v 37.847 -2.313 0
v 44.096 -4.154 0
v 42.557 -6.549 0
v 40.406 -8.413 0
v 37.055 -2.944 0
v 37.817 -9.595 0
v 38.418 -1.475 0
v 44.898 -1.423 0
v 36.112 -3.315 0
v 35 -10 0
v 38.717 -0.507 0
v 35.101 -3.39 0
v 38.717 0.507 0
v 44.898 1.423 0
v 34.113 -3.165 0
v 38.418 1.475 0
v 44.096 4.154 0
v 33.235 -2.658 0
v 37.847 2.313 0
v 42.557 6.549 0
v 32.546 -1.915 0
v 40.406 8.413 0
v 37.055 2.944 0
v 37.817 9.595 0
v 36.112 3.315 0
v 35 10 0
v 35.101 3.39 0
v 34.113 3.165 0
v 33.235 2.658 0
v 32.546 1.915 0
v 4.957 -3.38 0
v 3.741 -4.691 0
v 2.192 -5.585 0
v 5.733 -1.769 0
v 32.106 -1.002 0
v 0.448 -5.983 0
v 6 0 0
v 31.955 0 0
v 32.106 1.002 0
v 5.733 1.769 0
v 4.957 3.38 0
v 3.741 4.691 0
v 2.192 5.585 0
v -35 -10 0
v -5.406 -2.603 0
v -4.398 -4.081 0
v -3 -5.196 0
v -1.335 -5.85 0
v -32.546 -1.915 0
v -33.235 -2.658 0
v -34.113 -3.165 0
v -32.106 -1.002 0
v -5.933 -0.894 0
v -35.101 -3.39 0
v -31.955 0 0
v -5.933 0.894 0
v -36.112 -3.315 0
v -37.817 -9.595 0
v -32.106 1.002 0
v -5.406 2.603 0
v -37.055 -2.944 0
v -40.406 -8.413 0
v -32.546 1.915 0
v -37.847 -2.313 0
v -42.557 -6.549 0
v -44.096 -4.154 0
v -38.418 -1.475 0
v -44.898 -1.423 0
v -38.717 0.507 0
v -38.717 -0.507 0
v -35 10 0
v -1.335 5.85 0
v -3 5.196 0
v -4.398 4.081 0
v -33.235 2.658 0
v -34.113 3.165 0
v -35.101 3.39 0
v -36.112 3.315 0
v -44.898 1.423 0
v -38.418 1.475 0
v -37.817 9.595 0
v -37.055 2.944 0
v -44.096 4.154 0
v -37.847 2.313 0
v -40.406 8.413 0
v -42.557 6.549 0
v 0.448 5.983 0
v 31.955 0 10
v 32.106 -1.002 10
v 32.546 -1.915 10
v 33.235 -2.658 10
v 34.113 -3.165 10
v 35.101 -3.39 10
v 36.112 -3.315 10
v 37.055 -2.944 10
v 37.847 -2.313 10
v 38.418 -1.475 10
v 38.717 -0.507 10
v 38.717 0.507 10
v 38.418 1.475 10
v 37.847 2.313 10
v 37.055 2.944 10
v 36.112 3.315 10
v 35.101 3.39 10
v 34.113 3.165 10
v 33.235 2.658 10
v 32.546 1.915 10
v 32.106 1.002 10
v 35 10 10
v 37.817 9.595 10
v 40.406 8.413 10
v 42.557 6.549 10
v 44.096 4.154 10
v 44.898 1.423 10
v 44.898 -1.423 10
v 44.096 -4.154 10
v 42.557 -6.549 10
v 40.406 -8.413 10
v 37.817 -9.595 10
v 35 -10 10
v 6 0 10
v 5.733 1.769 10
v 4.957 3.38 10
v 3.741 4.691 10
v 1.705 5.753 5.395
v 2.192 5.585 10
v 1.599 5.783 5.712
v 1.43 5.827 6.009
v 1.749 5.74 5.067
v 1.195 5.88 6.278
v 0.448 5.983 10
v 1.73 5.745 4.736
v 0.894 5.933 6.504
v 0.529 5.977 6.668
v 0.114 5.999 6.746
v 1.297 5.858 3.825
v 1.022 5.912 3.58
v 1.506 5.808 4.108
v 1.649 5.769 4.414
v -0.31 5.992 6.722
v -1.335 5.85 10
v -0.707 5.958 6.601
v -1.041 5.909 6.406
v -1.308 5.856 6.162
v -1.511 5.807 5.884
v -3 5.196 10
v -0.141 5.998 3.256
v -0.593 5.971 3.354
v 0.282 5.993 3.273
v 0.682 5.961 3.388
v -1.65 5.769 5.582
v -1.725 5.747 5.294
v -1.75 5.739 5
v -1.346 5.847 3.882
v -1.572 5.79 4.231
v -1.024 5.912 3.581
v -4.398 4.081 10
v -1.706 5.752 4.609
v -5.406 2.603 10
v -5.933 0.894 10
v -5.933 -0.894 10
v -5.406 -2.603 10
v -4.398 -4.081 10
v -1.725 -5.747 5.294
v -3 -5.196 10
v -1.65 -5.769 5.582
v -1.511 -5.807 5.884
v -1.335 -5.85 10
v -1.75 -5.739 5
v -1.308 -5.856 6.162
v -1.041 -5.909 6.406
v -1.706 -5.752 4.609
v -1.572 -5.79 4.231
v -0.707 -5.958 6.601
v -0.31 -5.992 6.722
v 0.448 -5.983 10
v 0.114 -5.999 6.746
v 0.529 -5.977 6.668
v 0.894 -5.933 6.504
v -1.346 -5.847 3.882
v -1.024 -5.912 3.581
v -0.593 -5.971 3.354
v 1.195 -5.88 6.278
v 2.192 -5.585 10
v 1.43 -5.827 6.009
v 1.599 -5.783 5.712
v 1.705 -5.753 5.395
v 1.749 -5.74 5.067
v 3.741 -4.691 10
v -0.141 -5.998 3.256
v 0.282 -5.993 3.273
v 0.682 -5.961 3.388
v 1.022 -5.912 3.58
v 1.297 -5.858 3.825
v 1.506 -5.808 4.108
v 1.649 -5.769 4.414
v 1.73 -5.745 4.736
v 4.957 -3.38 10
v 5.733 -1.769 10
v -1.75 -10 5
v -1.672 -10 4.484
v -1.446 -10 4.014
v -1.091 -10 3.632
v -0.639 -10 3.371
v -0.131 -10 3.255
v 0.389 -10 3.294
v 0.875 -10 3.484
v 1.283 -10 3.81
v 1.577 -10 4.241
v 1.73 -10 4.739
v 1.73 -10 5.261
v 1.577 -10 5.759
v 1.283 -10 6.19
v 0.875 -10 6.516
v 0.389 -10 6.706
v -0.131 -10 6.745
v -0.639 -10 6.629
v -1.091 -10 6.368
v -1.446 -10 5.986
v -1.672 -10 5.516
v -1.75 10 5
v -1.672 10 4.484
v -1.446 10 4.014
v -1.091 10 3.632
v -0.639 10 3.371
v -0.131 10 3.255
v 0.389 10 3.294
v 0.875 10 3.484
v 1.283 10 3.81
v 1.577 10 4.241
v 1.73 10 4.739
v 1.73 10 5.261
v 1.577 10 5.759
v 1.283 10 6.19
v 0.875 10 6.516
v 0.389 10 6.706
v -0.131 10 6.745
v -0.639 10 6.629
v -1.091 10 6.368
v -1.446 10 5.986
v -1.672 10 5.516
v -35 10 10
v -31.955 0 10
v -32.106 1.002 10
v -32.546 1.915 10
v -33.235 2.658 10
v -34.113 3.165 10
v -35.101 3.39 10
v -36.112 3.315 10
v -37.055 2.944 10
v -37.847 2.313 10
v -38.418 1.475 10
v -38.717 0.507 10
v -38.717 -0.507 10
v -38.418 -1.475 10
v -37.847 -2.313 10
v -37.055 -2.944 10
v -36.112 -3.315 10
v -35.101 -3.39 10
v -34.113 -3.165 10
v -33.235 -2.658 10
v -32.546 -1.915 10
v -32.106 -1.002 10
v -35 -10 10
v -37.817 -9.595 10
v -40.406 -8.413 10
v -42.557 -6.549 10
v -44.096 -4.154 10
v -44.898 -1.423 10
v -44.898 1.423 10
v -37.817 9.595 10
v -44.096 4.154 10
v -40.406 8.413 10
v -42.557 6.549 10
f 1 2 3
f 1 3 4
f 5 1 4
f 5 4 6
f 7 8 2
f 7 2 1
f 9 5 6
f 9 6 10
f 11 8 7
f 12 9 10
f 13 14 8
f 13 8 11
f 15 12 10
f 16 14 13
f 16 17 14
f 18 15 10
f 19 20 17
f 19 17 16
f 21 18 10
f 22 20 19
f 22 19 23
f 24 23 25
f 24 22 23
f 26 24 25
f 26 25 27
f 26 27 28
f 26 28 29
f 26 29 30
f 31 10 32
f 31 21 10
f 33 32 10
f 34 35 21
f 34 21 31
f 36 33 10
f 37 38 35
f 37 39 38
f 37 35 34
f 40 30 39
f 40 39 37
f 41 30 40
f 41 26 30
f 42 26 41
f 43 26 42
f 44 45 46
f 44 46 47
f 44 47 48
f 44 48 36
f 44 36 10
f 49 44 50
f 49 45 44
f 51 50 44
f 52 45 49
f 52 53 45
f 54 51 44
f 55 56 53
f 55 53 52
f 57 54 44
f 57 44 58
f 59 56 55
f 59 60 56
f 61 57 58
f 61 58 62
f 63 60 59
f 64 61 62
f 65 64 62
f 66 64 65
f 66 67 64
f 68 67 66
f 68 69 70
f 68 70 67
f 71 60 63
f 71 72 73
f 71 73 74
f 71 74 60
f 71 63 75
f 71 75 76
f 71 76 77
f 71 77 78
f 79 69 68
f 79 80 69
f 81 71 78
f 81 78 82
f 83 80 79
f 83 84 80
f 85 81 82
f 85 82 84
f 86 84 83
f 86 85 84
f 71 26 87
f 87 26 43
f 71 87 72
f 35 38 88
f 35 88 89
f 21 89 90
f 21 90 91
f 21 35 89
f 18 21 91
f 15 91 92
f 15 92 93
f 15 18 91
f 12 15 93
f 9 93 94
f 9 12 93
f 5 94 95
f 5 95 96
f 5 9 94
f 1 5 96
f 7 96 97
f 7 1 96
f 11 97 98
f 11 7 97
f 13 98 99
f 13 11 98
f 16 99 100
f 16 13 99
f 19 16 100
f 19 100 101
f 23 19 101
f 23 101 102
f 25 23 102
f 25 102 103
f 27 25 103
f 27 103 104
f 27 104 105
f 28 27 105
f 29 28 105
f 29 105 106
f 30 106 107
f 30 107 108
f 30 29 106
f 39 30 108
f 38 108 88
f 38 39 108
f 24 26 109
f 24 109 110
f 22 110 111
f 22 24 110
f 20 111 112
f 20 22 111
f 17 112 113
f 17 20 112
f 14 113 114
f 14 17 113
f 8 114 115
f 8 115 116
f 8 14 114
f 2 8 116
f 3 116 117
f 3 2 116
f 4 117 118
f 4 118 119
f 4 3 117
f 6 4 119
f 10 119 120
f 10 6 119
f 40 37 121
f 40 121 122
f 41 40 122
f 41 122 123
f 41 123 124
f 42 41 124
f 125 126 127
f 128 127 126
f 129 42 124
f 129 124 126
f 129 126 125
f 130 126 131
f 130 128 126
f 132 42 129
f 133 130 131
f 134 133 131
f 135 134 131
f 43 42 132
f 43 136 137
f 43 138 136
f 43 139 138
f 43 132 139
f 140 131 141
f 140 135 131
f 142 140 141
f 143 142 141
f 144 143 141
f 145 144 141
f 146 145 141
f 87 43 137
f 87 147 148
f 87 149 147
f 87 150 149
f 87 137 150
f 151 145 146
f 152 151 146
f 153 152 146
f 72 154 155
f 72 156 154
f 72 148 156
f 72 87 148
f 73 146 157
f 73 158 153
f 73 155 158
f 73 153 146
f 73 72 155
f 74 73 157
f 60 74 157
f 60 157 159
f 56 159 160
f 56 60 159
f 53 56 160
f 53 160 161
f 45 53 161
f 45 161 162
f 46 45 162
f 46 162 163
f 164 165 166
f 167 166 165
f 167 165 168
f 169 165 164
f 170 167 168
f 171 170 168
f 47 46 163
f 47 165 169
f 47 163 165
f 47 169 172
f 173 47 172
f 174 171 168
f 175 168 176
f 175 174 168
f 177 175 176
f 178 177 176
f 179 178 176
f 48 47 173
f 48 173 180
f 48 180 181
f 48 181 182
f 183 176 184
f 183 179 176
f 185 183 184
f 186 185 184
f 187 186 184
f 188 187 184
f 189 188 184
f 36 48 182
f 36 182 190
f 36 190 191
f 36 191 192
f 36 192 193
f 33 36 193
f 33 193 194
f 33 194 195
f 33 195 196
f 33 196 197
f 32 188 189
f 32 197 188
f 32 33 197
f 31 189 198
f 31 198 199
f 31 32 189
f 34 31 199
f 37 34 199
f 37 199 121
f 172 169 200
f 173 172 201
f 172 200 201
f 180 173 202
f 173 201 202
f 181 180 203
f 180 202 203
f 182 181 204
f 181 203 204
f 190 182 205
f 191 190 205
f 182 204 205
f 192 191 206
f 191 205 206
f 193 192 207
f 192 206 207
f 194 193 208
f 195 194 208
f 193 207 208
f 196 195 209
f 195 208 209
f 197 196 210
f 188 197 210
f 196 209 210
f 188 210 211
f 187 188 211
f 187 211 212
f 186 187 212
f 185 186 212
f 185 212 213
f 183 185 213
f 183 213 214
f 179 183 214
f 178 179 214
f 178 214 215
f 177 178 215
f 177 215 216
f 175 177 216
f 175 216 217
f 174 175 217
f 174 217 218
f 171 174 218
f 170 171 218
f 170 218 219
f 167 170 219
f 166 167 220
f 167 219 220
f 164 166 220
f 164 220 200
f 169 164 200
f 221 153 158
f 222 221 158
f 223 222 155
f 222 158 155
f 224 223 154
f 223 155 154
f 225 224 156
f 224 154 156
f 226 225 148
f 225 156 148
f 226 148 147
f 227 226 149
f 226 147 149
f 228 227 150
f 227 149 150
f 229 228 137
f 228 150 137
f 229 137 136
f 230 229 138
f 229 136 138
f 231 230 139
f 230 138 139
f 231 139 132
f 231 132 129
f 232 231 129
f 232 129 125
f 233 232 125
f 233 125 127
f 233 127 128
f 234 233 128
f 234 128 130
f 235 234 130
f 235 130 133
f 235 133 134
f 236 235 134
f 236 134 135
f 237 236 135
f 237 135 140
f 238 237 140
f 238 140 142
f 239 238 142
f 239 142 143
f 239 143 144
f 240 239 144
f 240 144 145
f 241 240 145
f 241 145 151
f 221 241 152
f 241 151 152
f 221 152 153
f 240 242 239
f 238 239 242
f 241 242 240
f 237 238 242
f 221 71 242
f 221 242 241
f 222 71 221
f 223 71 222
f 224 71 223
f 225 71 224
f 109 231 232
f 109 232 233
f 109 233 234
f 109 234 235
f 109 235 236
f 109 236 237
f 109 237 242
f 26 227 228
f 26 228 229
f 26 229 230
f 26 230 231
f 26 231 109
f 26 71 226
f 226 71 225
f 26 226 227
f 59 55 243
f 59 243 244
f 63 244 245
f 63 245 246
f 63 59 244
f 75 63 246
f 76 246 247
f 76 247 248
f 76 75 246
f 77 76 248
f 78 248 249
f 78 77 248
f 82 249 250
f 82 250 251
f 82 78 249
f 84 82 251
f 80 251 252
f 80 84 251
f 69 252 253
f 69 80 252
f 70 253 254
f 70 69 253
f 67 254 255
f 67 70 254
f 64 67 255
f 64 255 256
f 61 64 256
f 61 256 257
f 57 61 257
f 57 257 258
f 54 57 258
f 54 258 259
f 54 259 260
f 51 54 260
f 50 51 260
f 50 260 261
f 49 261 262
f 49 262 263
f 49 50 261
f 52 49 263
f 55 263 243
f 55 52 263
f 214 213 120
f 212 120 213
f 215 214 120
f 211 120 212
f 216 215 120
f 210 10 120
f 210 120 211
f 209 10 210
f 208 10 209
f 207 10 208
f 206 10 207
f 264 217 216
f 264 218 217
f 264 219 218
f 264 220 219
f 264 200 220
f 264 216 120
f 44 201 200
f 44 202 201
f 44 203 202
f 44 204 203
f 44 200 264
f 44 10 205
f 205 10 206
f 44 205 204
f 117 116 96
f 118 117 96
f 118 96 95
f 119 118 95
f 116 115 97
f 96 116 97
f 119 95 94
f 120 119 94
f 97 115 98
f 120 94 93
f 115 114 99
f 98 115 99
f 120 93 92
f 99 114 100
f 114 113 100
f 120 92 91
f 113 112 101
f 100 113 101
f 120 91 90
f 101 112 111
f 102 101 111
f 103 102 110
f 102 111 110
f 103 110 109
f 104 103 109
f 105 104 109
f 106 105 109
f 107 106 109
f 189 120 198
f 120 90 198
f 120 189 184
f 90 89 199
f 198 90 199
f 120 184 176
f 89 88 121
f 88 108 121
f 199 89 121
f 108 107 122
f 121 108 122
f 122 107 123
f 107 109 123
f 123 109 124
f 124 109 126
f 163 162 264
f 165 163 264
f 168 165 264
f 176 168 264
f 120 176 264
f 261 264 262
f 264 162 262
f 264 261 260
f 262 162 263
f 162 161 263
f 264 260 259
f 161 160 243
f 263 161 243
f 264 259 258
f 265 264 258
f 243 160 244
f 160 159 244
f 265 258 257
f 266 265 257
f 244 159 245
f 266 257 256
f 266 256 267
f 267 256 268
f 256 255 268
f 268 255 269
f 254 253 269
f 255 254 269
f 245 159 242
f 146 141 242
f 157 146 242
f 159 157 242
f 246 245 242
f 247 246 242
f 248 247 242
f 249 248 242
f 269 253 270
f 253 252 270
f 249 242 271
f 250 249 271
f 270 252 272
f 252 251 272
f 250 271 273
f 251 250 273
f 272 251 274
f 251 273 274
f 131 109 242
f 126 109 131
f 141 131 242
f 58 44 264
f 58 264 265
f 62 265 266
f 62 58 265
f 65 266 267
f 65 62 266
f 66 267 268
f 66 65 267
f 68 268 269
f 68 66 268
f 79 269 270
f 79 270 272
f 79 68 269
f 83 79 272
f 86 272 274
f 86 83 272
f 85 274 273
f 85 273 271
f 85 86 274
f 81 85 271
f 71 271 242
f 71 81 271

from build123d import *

# Parameters (mm, degrees)
SKETCH16_R                 = 3.4
SKETCH16_R_2               = 6
BOSS_EXTRUDE3_DEPTH        = 10
F_3_5_3_5_DIAMETER_HOLE1_D = 3.5


with BuildPart() as part:
    # Sketch16 → Boss-Extrude3 (new body)
    with BuildSketch(Plane.XY):
        with BuildLine():
            Line((-35, 10), (35, 10))
            ThreePointArc((35, 10), (45, 0), (35, -10))
            Line((35, -10), (-35, -10))
            ThreePointArc((-35, -10), (-45, 0), (-35, 10))
        make_face()
        with Locations((-35.355, 0)):
            Circle(SKETCH16_R, mode=Mode.SUBTRACT)
        Circle(SKETCH16_R_2, mode=Mode.SUBTRACT)
        with Locations(Location((35.355, 0, 0), (0, 0, 180))):
            Circle(SKETCH16_R, mode=Mode.SUBTRACT)
    extrude(amount=BOSS_EXTRUDE3_DEPTH)

    # Ø3.5 (3.5) Diameter Hole1 (through all)
    with Locations(Plane(origin=(0, 10, 0), x_dir=(1, 0, 0), z_dir=(0, 1, 0))):
        with Locations((0, -5)):
            Hole(F_3_5_3_5_DIAMETER_HOLE1_D / 2)


solid = part.part
